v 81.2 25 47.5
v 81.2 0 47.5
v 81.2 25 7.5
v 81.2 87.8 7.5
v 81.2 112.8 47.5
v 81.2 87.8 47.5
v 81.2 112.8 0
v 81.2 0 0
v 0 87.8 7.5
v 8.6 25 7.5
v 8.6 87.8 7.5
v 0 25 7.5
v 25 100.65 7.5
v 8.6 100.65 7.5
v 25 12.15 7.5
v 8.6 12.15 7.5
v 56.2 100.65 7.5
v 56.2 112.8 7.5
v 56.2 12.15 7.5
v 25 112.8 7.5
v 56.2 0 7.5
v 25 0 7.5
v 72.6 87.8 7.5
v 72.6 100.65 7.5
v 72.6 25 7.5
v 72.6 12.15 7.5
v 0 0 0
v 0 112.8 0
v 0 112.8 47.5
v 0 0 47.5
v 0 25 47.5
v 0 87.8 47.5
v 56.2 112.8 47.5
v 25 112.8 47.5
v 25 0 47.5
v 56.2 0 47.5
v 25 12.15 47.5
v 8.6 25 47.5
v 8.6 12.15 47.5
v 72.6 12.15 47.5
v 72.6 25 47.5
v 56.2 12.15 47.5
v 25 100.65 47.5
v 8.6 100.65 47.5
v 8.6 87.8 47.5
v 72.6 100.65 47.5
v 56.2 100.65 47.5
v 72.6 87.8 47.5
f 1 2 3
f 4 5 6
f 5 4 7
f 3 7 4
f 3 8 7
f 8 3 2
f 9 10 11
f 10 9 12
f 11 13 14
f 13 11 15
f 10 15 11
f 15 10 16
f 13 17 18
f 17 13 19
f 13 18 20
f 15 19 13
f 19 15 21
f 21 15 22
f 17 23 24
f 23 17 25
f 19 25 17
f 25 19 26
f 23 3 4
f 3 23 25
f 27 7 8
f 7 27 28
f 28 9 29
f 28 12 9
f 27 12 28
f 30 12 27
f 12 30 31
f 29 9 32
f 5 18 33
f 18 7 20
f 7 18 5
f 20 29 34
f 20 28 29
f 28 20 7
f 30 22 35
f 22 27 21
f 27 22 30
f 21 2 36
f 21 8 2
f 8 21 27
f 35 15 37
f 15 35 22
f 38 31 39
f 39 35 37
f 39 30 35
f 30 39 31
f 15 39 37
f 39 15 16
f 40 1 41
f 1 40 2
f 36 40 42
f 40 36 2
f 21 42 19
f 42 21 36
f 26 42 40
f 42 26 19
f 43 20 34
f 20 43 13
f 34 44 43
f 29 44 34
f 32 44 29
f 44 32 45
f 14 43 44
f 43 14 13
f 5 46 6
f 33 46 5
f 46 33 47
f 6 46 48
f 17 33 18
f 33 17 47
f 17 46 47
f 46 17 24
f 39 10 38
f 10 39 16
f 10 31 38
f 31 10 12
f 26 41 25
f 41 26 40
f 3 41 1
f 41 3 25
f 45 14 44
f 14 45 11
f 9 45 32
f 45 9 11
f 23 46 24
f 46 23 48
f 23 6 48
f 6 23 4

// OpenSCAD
altura_total = 47.5;
grosor_pared_largo = 12.15;  // 12.15 zoo cards, 5.6 other cards
grosor_pared_ancho = 8.6;  // 8.6 zoo cards, 5.6 other cards

altura_mazo = 36; // 6.9 actions, 4.25 conservation projects, 3.85 final scoring, 36 zoo
espacio_superior = 4;

ancho_rail = 25; // 25 zoo cards, 20 other cards

ancho_carta = 64;
largo_carta = 88.5;

ancho_base = ancho_carta + 2*grosor_pared_ancho;
largo_base = largo_carta + 2*grosor_pared_largo;
altura_base = altura_total - altura_mazo - espacio_superior;

cube([ancho_base, largo_base, altura_base]);

altura_rail = altura_mazo + espacio_superior;

translate([0, 0, altura_base]) 
    cube([ancho_rail, grosor_pared_largo, altura_rail]);
    
translate([ancho_base - ancho_rail, 0, altura_base]) 
    cube([ancho_rail, grosor_pared_largo, altura_rail]);
    
translate([0, largo_base - grosor_pared_largo, altura_base]) 
    cube([ancho_rail, grosor_pared_largo, altura_rail]);
    
translate([ancho_base - ancho_rail, largo_base - grosor_pared_largo, altura_base]) 
    cube([ancho_rail, grosor_pared_largo, altura_rail]);


translate([0, 0, altura_base]) 
    cube([grosor_pared_ancho, ancho_rail, altura_rail]);
    
translate([ancho_base - grosor_pared_ancho, 0, altura_base]) 
    cube([grosor_pared_ancho, ancho_rail, altura_rail]);
    
translate([0, largo_base - ancho_rail, altura_base]) 
    cube([grosor_pared_ancho, ancho_rail, altura_rail]);
    
translate([ancho_base - grosor_pared_ancho, largo_base - ancho_rail, altura_base]) 
    cube([grosor_pared_ancho, ancho_rail, altura_rail]);
